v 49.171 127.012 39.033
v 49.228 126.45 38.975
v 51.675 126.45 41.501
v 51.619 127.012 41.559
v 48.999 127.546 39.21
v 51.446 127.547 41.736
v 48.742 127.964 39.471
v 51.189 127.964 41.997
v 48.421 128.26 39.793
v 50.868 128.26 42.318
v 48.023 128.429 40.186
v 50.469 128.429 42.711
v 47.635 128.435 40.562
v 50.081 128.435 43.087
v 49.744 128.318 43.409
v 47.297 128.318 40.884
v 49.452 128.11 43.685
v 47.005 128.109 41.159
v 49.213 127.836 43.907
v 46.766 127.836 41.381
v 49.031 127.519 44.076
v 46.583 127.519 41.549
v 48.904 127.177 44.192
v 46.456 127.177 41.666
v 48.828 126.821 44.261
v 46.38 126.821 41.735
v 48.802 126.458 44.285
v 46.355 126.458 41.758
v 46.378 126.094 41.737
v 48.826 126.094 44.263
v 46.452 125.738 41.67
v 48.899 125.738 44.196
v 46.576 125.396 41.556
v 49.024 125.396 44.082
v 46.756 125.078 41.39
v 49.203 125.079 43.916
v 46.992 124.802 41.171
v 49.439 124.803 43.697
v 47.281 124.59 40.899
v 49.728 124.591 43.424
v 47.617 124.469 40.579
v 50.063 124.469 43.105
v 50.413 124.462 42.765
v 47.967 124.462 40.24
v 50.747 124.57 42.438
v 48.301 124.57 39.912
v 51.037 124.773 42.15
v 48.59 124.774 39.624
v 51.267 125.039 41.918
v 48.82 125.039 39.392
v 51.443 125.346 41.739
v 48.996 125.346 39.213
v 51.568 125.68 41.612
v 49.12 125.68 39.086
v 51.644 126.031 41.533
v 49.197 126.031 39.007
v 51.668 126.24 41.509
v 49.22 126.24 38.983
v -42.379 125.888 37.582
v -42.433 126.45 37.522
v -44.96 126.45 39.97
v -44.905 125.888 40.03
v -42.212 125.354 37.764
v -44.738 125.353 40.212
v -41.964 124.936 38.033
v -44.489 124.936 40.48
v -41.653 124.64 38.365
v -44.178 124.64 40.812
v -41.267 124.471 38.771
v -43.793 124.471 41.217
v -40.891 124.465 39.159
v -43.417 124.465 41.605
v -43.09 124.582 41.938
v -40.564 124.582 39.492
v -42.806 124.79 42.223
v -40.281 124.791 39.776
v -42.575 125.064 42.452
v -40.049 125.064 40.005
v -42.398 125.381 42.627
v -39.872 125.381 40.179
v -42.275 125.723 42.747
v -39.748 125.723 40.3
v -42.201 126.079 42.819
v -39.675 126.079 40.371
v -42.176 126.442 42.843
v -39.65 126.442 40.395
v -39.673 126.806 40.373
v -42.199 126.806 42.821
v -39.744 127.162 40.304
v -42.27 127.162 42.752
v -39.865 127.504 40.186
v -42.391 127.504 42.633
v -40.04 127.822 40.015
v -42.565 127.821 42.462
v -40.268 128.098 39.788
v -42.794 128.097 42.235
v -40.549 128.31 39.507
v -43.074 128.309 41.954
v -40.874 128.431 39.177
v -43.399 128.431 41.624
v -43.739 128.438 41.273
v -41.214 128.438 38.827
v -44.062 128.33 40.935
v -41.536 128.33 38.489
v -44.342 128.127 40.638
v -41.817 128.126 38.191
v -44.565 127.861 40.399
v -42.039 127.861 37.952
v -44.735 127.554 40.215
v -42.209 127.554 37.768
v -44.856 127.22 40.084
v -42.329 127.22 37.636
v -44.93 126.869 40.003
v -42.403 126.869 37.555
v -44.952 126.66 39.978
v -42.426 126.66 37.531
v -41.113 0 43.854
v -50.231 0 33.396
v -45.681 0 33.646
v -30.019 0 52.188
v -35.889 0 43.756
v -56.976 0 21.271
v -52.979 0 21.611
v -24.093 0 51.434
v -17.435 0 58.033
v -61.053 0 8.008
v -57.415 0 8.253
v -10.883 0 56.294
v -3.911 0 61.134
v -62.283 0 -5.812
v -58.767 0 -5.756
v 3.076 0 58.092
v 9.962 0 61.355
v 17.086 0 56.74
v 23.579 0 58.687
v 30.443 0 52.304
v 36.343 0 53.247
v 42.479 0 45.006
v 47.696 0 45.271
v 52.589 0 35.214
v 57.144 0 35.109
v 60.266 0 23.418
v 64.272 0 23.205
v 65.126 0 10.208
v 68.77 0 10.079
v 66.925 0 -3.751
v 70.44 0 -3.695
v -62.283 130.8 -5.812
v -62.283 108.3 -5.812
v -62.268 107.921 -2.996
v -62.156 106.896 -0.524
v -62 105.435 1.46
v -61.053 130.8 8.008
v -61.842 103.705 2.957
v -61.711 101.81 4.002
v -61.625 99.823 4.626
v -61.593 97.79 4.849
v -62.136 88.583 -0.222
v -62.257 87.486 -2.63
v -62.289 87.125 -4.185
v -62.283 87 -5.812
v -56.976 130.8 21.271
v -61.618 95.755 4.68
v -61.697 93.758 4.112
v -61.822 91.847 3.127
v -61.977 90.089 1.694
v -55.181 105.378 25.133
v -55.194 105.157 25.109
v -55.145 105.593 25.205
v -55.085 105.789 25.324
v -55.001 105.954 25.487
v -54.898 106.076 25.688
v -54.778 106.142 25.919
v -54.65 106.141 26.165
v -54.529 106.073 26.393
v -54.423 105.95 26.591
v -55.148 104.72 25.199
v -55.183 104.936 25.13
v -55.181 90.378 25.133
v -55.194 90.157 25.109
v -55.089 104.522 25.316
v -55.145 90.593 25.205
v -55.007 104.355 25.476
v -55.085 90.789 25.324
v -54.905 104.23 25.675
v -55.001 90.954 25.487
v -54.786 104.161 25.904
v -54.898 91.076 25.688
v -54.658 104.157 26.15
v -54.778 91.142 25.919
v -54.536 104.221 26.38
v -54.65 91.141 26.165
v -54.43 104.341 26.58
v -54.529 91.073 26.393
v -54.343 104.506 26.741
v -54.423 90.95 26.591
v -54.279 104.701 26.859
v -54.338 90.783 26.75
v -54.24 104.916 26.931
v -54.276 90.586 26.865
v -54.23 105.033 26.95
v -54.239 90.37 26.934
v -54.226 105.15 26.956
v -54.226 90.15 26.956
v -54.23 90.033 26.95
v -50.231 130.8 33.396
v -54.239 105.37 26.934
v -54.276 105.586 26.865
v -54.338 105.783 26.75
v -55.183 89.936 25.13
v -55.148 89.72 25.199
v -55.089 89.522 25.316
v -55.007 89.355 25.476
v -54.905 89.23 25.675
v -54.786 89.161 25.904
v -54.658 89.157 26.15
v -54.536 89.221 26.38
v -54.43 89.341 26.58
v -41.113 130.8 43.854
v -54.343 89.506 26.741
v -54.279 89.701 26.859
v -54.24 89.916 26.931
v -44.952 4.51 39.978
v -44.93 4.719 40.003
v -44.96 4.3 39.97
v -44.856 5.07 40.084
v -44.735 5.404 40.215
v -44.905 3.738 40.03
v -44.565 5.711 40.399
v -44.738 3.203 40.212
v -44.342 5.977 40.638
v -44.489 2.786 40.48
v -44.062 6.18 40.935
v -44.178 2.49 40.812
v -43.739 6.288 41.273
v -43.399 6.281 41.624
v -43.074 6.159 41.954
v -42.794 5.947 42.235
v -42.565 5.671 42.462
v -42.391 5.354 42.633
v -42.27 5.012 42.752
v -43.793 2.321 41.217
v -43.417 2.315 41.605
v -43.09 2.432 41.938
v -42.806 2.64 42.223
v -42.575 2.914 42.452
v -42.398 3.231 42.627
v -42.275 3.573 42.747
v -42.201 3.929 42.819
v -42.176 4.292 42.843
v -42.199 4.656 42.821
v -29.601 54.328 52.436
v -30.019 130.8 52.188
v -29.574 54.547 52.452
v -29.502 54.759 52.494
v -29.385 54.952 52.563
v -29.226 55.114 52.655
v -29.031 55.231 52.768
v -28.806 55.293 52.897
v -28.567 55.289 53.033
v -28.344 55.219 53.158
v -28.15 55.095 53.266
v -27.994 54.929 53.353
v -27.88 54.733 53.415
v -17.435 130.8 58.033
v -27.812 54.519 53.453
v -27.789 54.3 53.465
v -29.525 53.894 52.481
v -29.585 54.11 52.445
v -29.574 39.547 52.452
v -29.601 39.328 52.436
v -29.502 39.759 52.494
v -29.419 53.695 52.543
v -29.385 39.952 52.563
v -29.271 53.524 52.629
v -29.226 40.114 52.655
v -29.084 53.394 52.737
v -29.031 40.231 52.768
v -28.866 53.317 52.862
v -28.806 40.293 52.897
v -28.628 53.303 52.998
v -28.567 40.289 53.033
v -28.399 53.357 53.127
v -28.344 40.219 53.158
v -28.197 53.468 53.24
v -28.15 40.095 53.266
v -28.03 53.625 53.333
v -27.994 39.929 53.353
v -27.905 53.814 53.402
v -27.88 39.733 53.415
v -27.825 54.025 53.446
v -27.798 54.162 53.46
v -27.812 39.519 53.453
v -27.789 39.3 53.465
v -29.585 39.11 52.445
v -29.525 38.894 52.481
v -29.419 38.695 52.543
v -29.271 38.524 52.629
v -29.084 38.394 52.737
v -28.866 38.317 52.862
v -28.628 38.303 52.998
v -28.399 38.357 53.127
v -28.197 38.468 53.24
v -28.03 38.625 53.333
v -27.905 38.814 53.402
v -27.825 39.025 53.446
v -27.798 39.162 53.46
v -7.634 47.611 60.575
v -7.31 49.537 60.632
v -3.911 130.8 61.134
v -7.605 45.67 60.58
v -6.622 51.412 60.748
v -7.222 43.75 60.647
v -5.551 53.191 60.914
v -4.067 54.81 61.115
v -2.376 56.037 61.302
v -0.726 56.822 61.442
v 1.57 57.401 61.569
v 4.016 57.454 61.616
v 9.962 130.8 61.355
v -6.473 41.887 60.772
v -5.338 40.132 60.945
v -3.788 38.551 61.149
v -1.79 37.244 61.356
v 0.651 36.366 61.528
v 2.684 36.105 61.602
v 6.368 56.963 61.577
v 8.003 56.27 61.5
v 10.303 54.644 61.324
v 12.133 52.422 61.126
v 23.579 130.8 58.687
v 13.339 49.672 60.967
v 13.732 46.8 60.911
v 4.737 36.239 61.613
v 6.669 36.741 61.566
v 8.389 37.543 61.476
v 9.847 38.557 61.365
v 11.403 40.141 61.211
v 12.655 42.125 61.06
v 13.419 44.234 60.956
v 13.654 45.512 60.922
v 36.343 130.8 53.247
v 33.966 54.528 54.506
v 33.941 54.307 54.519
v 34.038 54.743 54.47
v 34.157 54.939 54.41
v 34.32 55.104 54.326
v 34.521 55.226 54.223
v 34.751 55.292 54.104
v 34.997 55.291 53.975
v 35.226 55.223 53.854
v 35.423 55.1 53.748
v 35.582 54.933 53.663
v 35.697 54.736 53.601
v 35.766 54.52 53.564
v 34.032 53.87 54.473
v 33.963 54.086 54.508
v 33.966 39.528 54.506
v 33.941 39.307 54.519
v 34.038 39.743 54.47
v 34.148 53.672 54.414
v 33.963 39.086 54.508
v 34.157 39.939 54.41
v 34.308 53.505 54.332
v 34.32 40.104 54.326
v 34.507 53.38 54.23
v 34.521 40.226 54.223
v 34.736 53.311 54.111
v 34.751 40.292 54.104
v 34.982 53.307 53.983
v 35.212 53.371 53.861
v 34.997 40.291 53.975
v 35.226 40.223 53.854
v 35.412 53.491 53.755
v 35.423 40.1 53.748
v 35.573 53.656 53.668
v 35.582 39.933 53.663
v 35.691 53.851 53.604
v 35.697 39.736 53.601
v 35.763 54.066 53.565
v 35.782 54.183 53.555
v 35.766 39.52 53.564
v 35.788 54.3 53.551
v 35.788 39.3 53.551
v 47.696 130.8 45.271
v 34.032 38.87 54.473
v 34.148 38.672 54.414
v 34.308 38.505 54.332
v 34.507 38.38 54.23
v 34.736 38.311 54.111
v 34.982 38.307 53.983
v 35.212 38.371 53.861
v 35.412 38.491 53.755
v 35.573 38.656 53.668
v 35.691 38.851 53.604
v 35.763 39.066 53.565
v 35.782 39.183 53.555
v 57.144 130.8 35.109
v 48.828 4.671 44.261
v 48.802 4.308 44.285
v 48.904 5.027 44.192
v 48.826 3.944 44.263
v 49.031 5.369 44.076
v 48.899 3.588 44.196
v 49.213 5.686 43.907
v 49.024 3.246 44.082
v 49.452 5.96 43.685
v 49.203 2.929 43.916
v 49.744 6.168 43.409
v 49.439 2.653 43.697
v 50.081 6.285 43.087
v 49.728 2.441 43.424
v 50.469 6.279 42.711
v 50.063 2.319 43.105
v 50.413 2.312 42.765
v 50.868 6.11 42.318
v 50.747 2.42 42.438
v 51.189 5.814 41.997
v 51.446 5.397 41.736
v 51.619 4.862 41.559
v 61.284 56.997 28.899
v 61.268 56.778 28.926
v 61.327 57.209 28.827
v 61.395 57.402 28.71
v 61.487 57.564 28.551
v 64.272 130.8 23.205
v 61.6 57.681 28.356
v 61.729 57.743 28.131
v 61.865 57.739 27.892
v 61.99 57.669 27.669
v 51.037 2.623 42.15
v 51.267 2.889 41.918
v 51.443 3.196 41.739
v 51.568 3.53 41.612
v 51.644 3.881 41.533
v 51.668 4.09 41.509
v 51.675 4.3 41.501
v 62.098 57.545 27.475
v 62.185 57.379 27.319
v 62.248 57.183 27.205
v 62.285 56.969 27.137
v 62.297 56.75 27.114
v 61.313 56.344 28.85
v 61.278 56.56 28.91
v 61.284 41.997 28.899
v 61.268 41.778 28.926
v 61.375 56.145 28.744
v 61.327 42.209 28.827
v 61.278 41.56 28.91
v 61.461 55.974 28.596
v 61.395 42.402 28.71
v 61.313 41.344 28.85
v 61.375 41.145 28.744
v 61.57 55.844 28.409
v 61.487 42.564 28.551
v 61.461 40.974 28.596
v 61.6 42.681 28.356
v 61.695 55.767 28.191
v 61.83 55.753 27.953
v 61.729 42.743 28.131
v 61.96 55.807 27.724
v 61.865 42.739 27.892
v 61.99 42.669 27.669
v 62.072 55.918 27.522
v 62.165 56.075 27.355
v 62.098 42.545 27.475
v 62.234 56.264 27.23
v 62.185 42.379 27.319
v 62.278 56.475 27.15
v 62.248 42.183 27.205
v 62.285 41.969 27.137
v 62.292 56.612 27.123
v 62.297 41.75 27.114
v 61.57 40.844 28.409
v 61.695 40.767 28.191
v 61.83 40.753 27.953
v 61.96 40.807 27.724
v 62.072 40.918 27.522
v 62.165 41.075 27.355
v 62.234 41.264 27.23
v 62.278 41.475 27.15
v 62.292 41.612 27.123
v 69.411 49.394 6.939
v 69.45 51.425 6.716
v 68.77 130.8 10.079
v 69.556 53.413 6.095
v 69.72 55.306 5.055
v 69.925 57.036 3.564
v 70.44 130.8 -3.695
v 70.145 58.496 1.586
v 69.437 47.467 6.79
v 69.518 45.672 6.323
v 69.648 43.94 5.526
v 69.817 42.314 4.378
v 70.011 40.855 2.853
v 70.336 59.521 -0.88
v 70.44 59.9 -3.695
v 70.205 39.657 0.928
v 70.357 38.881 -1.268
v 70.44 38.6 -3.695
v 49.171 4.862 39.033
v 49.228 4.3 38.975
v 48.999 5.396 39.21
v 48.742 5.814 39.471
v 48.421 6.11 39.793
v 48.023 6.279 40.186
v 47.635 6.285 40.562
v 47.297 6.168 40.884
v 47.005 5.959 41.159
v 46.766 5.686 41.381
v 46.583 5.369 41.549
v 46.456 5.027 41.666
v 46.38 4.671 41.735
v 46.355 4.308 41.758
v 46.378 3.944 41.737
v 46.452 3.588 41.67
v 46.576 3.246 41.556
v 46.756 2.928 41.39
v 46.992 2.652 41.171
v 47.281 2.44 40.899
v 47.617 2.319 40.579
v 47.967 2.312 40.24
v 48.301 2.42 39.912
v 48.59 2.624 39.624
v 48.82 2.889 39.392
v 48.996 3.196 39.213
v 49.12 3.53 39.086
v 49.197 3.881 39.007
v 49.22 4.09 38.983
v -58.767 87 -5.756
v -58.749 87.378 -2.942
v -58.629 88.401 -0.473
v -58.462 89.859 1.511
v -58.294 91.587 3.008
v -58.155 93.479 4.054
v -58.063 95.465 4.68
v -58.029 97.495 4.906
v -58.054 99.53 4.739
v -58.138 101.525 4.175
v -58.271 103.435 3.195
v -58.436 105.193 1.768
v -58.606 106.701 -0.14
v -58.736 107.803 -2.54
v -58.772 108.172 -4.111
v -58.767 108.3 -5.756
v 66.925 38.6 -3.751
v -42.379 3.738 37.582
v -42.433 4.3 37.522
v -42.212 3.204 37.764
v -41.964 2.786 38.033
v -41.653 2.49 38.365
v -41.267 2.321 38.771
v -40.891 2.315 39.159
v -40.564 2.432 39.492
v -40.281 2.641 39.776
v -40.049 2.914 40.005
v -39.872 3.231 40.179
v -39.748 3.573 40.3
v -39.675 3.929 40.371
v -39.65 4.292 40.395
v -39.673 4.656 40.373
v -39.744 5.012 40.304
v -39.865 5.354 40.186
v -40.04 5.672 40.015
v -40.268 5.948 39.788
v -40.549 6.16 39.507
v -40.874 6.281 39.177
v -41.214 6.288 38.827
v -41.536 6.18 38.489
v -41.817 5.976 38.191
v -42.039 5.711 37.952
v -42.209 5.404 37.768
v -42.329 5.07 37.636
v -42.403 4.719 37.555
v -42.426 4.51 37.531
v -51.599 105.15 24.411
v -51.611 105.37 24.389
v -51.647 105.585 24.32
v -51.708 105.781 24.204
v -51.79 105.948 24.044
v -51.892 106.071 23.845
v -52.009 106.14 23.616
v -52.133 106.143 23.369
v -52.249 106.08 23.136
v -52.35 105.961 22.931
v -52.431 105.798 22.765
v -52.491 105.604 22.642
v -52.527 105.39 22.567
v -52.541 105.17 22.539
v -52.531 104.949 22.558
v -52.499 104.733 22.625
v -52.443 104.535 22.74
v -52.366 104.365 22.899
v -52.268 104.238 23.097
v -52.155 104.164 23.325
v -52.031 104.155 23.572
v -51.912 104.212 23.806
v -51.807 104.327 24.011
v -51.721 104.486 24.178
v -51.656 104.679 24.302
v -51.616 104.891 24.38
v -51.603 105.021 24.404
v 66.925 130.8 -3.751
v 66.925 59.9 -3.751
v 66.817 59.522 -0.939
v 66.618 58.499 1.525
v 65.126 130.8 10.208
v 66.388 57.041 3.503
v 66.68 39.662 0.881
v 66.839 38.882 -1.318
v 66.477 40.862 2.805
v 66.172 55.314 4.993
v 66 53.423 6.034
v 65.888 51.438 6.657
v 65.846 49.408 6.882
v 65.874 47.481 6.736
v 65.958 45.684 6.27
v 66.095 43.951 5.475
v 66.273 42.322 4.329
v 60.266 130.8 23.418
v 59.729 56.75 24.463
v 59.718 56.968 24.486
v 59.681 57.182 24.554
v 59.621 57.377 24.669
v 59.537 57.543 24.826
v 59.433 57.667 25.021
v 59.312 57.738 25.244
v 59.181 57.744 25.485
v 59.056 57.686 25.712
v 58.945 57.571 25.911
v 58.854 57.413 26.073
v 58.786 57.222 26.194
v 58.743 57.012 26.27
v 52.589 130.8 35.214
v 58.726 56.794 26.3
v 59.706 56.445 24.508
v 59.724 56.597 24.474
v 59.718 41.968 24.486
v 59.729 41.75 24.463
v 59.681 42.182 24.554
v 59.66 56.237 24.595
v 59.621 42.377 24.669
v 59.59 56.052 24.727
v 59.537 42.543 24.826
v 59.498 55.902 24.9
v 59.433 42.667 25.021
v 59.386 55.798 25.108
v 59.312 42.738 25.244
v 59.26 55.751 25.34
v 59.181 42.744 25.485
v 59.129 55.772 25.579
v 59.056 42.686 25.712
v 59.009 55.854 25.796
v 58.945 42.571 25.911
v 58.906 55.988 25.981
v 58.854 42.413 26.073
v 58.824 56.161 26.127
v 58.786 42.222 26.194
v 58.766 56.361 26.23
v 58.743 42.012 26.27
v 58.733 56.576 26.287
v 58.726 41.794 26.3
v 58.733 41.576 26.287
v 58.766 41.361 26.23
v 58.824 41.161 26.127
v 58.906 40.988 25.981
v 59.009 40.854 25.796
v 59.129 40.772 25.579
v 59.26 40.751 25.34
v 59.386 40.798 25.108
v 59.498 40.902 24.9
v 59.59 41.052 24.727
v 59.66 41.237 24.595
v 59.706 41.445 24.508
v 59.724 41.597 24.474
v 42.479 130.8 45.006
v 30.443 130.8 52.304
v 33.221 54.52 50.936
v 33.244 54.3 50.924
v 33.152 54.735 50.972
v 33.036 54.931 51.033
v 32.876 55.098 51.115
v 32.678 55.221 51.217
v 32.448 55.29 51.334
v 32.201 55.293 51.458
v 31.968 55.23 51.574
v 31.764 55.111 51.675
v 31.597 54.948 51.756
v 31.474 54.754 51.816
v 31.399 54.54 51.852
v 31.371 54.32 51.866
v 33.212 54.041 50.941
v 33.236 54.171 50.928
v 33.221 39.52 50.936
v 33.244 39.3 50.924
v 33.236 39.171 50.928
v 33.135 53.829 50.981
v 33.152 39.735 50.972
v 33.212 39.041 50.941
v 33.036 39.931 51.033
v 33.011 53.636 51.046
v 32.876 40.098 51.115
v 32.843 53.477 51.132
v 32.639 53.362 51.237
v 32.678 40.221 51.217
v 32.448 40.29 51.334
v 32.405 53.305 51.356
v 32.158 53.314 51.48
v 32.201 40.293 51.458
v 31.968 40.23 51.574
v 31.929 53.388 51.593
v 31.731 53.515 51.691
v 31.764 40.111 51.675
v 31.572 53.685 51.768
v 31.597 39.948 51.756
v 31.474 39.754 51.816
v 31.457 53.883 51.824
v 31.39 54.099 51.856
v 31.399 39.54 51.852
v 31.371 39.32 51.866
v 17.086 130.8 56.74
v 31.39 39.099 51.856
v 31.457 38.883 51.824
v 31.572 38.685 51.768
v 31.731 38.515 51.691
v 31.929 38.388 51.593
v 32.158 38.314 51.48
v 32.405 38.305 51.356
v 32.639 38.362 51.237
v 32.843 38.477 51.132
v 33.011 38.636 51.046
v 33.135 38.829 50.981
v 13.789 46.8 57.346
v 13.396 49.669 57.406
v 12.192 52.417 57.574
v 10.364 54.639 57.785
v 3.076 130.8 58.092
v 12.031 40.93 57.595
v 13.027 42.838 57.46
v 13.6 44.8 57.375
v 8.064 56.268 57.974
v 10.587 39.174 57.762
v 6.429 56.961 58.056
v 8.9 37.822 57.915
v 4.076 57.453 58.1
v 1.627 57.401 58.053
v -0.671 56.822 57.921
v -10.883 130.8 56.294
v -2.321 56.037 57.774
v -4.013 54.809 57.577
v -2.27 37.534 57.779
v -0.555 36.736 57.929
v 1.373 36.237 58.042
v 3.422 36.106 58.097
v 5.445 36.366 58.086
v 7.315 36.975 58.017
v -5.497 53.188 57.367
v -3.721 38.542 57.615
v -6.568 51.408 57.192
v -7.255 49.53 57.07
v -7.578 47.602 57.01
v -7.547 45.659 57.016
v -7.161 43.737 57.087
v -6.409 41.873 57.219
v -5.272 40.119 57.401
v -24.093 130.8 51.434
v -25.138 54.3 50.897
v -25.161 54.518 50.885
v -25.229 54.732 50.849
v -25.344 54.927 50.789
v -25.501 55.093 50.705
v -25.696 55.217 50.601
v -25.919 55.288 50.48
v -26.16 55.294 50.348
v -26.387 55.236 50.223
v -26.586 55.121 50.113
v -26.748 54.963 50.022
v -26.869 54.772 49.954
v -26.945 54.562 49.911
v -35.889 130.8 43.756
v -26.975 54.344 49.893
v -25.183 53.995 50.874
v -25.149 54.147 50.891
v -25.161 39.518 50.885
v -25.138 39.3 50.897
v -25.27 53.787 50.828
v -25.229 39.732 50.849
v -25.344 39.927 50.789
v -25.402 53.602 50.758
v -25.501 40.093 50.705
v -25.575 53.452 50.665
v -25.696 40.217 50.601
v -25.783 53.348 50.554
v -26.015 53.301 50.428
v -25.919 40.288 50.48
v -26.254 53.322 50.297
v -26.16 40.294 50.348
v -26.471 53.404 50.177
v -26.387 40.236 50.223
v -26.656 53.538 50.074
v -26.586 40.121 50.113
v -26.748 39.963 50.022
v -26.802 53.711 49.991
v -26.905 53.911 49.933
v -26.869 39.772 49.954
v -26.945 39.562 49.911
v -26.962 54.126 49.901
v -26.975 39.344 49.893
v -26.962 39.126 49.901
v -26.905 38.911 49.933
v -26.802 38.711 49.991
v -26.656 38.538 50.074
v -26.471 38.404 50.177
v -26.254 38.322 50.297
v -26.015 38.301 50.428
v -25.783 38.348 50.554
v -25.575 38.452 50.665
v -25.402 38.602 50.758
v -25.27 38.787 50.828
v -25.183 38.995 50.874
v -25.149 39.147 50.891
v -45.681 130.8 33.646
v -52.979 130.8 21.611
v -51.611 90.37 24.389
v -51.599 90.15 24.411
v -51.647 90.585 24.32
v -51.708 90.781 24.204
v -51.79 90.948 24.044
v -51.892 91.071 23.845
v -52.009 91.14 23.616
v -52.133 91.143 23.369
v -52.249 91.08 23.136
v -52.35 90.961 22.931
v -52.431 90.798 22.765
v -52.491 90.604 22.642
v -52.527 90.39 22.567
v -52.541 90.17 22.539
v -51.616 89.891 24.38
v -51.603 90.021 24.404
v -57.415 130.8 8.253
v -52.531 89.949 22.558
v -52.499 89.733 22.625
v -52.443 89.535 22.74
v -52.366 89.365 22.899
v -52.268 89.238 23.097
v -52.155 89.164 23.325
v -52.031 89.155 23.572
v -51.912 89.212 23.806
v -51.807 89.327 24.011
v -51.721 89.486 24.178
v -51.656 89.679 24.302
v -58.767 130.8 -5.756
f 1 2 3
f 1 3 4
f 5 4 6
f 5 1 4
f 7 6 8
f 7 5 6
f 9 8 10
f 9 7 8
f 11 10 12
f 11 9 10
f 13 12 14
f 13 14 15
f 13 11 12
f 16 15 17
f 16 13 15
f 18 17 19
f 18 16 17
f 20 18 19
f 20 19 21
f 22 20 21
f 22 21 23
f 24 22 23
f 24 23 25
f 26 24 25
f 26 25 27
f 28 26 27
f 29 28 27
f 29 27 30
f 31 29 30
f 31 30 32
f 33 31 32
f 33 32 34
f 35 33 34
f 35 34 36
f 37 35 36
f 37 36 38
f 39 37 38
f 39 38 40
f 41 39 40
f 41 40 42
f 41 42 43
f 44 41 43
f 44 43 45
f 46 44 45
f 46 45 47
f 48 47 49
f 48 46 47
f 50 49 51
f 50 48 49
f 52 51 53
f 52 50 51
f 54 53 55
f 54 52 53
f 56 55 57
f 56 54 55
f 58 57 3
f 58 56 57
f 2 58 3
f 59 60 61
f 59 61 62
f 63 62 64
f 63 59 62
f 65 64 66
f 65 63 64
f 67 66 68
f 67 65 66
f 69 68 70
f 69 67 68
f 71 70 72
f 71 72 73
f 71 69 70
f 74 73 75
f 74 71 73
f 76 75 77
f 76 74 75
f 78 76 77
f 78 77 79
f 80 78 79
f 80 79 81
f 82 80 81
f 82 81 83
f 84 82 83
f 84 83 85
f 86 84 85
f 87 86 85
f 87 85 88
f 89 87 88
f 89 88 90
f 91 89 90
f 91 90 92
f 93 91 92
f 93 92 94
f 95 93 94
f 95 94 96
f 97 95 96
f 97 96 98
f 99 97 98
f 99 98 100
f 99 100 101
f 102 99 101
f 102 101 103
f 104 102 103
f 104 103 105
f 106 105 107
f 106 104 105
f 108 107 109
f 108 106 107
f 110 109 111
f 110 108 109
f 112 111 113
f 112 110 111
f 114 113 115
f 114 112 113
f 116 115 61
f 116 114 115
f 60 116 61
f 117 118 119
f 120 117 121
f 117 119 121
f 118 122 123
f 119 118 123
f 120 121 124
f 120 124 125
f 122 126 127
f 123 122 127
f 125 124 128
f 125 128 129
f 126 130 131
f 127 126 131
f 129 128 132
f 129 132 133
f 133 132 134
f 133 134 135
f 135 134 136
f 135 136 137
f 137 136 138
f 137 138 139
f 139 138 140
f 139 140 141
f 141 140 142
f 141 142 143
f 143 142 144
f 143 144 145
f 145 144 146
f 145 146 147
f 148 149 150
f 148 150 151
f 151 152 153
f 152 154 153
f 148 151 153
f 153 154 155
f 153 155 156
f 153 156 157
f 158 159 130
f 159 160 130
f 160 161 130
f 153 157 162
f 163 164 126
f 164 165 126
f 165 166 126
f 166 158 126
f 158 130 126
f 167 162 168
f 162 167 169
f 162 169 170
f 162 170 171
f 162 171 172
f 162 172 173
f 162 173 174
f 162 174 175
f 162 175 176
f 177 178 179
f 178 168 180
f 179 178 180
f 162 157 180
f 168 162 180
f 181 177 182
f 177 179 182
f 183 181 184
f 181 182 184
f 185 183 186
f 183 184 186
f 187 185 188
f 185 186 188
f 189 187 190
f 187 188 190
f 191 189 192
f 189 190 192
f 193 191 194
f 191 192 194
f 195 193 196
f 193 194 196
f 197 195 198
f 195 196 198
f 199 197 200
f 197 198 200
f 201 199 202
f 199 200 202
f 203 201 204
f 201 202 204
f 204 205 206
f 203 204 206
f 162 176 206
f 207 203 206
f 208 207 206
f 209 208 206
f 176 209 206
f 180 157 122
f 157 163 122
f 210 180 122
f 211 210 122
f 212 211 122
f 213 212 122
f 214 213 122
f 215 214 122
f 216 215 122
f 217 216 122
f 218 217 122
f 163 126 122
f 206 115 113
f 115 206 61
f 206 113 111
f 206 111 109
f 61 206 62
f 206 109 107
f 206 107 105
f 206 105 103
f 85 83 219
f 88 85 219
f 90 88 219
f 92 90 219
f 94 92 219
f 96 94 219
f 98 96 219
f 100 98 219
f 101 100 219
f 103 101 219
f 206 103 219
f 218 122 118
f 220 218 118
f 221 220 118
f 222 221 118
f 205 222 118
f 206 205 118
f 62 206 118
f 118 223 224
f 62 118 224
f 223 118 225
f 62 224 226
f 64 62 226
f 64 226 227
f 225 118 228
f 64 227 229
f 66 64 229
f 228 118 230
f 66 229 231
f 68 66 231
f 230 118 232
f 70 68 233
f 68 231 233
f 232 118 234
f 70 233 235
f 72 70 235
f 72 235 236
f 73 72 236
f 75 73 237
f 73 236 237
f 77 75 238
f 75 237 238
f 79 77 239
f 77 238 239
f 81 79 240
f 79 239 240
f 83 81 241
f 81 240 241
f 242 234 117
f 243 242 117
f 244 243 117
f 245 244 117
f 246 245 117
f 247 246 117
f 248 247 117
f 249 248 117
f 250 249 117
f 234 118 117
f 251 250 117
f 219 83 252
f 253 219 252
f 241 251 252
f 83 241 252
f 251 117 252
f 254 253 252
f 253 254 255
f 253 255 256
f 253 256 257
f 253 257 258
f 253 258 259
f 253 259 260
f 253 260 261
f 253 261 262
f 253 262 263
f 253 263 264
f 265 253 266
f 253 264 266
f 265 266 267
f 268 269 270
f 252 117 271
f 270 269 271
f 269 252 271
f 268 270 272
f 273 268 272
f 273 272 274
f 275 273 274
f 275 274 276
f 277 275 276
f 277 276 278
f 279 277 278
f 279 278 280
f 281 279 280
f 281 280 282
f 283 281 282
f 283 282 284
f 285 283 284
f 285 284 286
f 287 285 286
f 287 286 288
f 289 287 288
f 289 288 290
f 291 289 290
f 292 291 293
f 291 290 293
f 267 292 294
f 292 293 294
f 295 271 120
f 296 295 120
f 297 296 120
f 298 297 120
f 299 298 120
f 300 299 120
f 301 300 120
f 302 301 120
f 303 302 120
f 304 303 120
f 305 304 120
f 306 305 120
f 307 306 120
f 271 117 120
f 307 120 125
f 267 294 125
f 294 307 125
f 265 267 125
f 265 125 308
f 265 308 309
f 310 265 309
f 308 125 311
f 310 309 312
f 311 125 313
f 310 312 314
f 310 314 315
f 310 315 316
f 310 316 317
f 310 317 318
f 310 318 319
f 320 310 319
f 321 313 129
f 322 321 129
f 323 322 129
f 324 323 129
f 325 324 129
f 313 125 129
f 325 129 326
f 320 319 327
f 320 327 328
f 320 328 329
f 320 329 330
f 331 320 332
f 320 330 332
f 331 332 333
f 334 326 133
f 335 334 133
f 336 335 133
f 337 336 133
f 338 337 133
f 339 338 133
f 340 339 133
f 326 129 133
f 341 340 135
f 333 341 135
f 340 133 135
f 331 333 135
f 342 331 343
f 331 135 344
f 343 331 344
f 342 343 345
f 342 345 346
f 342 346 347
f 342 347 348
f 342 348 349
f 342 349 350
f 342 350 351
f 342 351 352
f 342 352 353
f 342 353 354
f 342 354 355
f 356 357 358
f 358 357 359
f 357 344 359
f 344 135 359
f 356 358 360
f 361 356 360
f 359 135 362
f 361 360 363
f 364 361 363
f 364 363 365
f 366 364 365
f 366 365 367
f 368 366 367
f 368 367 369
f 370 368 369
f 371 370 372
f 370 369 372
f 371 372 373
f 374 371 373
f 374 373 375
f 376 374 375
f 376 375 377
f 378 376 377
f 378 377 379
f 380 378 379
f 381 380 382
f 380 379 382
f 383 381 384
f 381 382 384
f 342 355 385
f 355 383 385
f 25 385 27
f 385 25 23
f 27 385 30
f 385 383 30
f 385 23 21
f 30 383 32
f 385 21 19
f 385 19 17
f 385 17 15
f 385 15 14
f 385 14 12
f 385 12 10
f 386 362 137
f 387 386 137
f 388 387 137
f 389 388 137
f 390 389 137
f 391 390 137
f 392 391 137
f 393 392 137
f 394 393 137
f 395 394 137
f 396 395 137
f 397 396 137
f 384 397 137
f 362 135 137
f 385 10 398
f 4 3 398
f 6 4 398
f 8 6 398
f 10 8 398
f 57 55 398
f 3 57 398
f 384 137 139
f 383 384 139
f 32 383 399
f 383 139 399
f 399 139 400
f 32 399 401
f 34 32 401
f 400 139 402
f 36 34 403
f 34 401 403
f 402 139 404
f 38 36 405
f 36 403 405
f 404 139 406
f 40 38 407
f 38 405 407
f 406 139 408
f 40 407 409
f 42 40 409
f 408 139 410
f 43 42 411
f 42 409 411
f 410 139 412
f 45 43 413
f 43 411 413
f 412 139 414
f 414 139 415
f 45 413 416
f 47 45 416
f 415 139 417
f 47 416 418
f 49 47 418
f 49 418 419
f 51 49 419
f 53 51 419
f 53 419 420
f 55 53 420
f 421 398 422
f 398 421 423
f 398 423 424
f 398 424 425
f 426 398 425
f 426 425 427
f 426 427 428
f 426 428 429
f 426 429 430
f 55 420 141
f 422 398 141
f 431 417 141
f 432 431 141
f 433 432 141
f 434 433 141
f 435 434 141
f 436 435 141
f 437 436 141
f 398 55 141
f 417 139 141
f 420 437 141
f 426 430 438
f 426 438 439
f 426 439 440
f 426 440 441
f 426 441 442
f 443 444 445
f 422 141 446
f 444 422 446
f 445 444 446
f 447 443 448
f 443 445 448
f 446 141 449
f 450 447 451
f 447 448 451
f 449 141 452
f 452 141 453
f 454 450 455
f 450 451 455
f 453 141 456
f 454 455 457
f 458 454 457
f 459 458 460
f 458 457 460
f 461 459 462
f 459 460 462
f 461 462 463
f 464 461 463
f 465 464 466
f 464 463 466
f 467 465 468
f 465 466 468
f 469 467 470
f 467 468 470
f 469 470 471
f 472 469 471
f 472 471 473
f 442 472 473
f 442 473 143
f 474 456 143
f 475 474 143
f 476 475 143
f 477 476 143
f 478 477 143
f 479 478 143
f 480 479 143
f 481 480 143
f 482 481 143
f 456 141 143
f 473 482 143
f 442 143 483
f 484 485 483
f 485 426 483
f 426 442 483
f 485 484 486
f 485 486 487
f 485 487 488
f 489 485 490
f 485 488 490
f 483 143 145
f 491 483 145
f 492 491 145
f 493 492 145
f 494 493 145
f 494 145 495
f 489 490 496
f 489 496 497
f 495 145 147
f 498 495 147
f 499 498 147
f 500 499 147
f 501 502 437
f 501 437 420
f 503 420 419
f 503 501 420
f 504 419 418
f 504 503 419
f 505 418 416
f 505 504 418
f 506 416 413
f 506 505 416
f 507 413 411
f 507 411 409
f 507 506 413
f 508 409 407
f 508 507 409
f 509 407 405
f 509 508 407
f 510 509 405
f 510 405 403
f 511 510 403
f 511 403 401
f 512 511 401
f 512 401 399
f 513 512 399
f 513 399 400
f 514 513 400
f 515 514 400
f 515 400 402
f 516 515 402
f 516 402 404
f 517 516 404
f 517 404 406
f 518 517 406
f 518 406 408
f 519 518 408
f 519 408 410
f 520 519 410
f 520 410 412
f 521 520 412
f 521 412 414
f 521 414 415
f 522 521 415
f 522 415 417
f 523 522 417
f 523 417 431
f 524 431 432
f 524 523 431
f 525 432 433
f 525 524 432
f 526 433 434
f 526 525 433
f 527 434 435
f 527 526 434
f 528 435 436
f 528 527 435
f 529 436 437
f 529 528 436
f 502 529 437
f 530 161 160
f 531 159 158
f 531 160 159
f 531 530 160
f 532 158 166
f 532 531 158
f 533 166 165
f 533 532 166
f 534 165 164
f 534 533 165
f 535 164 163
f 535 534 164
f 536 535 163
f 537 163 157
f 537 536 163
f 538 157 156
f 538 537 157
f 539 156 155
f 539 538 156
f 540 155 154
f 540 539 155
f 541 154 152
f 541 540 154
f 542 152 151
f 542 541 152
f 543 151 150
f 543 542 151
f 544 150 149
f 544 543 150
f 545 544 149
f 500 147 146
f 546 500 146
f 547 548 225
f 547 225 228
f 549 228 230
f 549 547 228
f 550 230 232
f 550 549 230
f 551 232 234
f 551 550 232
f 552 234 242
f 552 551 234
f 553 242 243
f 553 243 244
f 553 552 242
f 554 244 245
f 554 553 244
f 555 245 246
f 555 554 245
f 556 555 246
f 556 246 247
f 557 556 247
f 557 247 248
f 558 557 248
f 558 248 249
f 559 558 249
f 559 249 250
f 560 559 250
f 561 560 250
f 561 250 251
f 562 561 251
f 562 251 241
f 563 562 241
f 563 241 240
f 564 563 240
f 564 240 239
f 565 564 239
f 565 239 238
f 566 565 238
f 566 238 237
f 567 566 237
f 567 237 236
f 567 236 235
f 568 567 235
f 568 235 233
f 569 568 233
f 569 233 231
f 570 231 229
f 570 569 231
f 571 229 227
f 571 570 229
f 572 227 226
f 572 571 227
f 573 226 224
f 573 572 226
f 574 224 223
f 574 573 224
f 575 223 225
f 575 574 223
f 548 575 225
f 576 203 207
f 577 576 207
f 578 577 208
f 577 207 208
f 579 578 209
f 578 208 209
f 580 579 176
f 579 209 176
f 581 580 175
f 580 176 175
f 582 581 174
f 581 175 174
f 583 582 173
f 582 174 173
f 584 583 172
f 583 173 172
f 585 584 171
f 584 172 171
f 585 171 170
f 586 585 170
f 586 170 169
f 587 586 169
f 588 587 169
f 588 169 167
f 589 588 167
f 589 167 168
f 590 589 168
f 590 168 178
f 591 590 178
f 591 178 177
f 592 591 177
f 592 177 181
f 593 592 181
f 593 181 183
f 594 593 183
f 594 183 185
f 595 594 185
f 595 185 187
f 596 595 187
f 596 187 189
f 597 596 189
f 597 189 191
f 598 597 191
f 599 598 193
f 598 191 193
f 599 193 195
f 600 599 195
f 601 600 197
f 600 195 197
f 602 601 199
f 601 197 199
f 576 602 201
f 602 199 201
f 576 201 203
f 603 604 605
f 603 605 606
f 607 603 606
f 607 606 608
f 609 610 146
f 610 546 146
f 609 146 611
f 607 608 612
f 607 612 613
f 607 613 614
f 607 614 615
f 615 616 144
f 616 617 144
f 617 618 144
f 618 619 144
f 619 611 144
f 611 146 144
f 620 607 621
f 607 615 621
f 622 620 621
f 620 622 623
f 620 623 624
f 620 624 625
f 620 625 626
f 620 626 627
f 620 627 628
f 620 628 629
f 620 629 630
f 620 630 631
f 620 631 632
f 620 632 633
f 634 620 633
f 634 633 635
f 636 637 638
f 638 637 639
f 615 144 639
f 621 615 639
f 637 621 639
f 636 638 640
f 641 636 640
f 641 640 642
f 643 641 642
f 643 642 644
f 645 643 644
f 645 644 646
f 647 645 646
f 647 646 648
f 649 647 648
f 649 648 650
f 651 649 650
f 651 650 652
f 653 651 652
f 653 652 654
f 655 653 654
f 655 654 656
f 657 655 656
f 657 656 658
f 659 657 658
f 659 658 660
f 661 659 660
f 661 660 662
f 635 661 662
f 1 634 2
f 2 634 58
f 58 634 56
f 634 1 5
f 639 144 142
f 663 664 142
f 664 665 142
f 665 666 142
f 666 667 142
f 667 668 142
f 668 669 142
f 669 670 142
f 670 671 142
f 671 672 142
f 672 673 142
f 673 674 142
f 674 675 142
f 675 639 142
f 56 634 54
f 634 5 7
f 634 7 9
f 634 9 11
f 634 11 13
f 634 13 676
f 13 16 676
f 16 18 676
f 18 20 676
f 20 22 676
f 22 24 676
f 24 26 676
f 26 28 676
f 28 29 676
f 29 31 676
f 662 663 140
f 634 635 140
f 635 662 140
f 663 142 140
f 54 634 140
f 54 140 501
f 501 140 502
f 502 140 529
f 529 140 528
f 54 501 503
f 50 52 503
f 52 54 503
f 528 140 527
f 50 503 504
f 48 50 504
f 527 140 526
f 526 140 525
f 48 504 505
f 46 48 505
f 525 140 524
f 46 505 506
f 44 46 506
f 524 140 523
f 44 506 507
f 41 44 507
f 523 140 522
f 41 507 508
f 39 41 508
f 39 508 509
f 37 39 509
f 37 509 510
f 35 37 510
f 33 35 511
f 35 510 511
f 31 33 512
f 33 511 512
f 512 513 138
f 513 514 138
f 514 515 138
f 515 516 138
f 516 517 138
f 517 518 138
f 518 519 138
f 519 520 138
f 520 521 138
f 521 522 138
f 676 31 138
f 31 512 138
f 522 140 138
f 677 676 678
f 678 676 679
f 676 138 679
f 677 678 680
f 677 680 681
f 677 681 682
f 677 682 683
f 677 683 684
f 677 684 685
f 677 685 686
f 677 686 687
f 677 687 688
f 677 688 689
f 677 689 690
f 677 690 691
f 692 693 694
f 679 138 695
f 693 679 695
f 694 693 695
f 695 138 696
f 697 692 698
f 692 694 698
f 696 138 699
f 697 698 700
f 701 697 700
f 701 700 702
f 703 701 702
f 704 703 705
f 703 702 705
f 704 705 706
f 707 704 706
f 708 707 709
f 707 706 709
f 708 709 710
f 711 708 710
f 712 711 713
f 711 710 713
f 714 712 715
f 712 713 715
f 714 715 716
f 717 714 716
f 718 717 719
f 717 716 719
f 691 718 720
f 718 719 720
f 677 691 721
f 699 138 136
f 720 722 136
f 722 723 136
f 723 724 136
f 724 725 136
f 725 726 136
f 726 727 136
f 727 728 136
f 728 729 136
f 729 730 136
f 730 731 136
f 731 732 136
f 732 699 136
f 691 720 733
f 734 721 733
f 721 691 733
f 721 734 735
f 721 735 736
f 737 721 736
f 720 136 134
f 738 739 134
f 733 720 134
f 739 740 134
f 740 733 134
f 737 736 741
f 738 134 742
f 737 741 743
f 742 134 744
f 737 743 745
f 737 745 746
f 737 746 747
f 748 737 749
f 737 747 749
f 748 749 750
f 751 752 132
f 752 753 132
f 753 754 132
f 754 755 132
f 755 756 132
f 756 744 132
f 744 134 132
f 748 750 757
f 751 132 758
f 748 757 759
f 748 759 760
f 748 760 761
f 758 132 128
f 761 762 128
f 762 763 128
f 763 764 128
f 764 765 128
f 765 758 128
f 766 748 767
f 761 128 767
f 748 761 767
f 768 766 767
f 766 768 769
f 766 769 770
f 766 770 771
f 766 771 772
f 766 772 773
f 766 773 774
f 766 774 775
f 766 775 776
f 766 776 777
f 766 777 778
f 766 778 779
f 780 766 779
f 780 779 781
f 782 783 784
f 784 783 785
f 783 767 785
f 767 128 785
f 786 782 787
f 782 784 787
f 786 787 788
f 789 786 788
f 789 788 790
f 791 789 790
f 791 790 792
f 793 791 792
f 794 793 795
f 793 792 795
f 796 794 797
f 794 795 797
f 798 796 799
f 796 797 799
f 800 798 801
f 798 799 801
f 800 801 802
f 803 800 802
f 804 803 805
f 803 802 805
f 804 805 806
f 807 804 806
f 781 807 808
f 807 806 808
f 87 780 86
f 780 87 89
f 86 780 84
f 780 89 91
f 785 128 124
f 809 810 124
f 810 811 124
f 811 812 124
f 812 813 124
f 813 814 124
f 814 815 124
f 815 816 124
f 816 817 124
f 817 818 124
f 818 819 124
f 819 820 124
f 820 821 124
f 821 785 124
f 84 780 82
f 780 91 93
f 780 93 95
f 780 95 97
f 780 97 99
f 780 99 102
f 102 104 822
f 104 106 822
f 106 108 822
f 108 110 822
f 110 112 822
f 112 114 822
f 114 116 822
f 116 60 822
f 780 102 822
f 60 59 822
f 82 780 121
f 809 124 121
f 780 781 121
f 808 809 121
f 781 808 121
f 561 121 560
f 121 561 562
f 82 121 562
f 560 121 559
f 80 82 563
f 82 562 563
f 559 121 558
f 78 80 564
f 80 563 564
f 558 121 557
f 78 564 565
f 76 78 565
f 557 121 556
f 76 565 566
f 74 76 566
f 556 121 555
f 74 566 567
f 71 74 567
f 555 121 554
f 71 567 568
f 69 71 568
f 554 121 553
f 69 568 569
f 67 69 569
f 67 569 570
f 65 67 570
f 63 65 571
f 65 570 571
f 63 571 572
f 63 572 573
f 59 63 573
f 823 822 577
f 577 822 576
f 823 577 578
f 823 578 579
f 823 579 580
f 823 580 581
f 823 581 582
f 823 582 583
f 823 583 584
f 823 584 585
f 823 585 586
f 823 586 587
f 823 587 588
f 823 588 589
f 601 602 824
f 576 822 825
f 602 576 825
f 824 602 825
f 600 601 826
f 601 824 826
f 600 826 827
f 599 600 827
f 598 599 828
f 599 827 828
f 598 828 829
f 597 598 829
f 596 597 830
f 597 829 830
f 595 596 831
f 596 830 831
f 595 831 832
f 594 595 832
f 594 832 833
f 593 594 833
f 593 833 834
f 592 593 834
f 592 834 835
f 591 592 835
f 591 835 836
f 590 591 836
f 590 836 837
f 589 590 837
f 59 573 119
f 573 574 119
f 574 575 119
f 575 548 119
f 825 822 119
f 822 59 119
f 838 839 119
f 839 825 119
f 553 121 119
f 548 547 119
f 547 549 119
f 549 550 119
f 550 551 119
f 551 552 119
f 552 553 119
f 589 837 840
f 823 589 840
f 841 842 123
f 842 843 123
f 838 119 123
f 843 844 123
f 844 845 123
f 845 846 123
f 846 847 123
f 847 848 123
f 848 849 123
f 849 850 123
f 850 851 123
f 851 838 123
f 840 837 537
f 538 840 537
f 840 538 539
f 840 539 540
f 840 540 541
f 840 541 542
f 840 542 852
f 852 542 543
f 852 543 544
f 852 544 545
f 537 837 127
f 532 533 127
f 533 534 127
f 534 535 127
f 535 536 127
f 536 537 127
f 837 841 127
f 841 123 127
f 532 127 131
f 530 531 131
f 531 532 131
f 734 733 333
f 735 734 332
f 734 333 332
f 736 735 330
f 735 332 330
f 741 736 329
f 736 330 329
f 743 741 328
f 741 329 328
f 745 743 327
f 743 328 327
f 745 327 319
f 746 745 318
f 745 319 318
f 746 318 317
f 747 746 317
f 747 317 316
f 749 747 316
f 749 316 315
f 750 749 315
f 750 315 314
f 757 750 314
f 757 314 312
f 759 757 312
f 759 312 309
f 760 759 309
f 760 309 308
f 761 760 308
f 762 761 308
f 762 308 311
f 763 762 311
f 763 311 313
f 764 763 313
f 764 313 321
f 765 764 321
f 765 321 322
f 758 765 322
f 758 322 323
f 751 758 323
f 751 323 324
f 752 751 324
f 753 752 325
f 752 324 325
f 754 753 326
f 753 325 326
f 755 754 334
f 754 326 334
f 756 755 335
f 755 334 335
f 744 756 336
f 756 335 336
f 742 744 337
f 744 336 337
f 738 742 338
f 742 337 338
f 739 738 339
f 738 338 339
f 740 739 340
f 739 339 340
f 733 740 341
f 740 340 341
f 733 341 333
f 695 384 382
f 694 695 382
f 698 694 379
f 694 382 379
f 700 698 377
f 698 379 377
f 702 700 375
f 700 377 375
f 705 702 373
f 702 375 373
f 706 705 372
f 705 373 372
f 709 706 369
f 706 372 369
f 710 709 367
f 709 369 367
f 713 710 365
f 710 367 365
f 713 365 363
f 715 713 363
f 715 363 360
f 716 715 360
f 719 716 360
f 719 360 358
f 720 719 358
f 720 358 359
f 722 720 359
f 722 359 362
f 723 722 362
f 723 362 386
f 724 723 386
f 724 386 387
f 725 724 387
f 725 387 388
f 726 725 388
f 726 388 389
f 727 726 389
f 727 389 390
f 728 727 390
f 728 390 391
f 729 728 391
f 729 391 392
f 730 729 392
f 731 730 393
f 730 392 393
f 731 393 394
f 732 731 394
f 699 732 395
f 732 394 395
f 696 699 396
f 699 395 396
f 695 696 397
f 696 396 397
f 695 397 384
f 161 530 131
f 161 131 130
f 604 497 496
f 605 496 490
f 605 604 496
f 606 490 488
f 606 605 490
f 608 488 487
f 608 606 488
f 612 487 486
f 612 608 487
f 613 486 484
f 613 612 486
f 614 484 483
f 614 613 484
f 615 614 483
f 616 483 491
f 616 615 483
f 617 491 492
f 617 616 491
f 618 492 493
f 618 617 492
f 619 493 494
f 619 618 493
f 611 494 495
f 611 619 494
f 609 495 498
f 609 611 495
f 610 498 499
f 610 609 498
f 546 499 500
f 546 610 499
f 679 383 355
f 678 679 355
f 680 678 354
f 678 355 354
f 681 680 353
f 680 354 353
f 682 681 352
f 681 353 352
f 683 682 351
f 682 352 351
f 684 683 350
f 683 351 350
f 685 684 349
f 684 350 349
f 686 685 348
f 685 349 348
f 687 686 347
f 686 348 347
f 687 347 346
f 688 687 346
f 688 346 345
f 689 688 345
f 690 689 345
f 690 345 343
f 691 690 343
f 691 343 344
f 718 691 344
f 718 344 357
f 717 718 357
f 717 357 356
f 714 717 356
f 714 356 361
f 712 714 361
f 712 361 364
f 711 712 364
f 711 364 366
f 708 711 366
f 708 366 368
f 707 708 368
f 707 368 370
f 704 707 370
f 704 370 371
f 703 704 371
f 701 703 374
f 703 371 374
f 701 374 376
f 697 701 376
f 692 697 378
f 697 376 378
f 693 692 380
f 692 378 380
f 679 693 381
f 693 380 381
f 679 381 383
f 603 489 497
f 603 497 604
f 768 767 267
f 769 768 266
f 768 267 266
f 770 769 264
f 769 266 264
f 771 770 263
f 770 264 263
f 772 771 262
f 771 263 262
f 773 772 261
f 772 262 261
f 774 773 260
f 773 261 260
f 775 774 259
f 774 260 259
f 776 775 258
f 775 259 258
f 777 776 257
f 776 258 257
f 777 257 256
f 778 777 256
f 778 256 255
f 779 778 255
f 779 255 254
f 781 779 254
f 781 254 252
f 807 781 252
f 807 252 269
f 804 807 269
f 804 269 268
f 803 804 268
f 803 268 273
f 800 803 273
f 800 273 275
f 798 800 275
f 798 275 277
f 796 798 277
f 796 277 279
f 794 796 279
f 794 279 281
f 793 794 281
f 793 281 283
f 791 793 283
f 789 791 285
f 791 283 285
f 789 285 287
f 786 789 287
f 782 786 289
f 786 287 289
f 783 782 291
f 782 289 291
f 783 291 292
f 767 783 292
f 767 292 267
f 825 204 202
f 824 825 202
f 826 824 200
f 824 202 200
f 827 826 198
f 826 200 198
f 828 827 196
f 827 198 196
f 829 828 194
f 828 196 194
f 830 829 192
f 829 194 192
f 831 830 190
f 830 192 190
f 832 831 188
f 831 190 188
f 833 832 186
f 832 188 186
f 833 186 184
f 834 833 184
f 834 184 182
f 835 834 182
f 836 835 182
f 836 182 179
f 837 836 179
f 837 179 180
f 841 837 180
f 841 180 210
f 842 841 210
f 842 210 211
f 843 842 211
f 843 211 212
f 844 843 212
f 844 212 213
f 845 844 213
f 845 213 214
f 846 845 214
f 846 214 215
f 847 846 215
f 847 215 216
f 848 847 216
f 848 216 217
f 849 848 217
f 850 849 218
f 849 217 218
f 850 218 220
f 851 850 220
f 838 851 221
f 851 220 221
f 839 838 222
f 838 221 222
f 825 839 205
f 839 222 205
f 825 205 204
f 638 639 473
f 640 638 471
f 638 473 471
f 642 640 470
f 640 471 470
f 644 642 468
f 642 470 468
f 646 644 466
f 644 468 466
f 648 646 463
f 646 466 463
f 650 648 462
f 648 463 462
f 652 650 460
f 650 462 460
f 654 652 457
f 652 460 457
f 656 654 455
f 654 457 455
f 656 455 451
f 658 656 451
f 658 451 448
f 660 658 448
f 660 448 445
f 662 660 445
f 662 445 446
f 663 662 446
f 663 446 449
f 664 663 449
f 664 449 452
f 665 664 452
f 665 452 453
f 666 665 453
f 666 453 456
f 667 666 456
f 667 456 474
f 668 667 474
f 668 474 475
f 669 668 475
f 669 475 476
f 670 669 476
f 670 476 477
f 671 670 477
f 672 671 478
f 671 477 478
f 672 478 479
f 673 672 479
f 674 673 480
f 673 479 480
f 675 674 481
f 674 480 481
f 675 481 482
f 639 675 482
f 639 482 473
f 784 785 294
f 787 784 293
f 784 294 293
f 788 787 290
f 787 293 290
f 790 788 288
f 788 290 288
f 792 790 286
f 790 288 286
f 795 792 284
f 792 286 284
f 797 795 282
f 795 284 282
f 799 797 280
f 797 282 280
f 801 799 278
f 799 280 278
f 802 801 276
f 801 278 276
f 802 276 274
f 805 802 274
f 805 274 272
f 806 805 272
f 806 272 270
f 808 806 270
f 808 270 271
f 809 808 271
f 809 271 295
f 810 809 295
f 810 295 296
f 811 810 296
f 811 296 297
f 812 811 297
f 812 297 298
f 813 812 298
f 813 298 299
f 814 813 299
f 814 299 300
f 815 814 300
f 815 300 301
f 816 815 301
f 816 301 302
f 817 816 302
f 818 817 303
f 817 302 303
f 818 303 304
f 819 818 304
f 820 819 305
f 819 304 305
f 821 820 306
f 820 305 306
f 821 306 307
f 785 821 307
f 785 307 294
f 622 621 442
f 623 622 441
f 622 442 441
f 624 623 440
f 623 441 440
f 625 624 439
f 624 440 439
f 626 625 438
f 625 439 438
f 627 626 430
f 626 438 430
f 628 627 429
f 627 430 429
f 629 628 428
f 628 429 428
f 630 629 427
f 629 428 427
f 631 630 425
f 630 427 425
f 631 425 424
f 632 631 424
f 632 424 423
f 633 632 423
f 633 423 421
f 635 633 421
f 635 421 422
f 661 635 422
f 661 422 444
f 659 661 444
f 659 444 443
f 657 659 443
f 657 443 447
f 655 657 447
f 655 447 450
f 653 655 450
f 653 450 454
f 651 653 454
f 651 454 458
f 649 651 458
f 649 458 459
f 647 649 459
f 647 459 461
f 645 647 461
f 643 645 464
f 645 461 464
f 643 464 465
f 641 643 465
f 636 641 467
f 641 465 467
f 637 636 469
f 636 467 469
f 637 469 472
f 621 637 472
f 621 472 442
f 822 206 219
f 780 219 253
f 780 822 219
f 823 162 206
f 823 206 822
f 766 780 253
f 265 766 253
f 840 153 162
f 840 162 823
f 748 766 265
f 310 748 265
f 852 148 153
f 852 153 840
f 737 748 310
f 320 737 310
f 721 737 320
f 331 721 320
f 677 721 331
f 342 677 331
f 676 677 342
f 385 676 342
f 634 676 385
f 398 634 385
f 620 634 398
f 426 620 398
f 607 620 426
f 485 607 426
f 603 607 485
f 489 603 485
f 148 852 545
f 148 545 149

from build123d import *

# Parameters (mm, degrees)
BOSS_EXTRUDE1_DEPTH      = 130.8
SKETCH5_R                = 10.65
CUT_EXTRUDE4_DEPTH       = 129.8
SKETCH6_R                = 10.65
CUT_EXTRUDE5_DEPTH       = 129.8
SKETCH57_R               = 10.7
CUT_EXTRUDE48_DEPTH      = 148.089829044
CUT_EXTRUDE51_DEPTH      = 132.35522197
CUT_EXTRUDE51_DEPTH_BACK = 132.35522197
SKETCH60_R               = 2
CUT_EXTRUDE52_DEPTH      = 132.574432074
CUT_EXTRUDE52_DEPTH_BACK = 132.574432074
SKETCH61_R               = 2.000000001
SKETCH63_R               = 1
CUT_EXTRUDE53_DEPTH      = 155.429604817
SKETCH64_R               = 1
CUT_EXTRUDE54_DEPTH      = 157.678735431
SKETCH65_R               = 1
CUT_EXTRUDE55_DEPTH      = 157.678735431
SKETCH66_R               = 1
CUT_EXTRUDE56_DEPTH      = 155.429604817


with BuildPart() as part:
    # Sketch1 → Boss-Extrude1 (new body)
    with BuildSketch(Plane(origin=(0, 0, 0), x_dir=(0.999872775920664, 0, 0.01595092388251422), z_dir=(0, 1, 0))):
        with BuildLine():
            Line((70.372282363, 4.818066557), (66.856282363, 4.818066557))
            ThreePointArc((66.856282363, 4.818066557), (4.002282363, -58.035933443), (-58.851717637, 4.818066557))
            Line((-58.851717637, 4.818066557), (-62.367717637, 4.818066557))
            ThreePointArc((-62.367717637, 4.818066557), (4.002282363, -61.551933443), (70.372282363, 4.818066557))
        make_face()
    extrude(amount=BOSS_EXTRUDE1_DEPTH)

    # Sketch5 → Cut-Extrude4 (cut)
    with BuildSketch(Plane(origin=(63.687908888, 47.899932993, -8.621348971), x_dir=(0.015950923882504298, 0, -0.9998727759206641), z_dir=(0.9998727759206643, 0, 0.015950923882504298))):
        with Locations((-4.818066557, 1.350067007)):
            Circle(SKETCH5_R)
    extrude(amount=CUT_EXTRUDE4_DEPTH, mode=Mode.SUBTRACT)

    # Sketch6 → Cut-Extrude5 (cut)
    with BuildSketch(Plane(origin=(-55.376952084, 47.899932993, -10.520785159), x_dir=(-0.01595092388248271, 0, 0.9998727759206645), z_dir=(-0.9998727759206645, 0, -0.01595092388248271))):
        with Locations((4.818066557, 49.750067007)):
            Circle(SKETCH6_R)
    extrude(amount=CUT_EXTRUDE5_DEPTH, mode=Mode.SUBTRACT)

    # Sketch57 → Cut-Extrude48 (cut, through all)
    with BuildSketch(Plane(origin=(-1.337515808, 38.899932993, 83.841265458), x_dir=(0.999872775920664, 0, 0.015950923882512152), z_dir=(-0.015950923882512152, 0, 0.999872775920664))):
        with Locations((4.002282363, 7.900067007)):
            Circle(SKETCH57_R)
    extrude(amount=-CUT_EXTRUDE48_DEPTH, mode=Mode.SUBTRACT)

    # Sketch60 → Cut-Extrude51 (cut, two sides: drawn at the far end of the back side and taken through both)
    with BuildSketch(Plane(origin=(4.479542792, 38.899932993, -4.33978545), x_dir=(0.6958141043149662, 0, 0.7182219240850013), z_dir=(-0.7182219240850013, 0, 0.6958141043149662)).offset(-CUT_EXTRUDE51_DEPTH_BACK)):
        with Locations((-0.576184071, 87.550067007)):
            Circle(SKETCH60_R)
        with Locations((-0.576184071, -34.599932993)):
            Circle(SKETCH60_R)
    extrude(amount=CUT_EXTRUDE51_DEPTH + CUT_EXTRUDE51_DEPTH_BACK, mode=Mode.SUBTRACT)

    # Sketch61 → Cut-Extrude52 (cut, two sides: drawn at the far end of the back side and taken through both)
    with BuildSketch(Plane(origin=(-0.400917003, 38.899932993, -0.413828032), x_dir=(0.7182219240850013, 0, -0.6958141043149662), z_dir=(0.6958141043149662, 0, 0.7182219240850013)).offset(-CUT_EXTRUDE52_DEPTH_BACK)):
        with Locations((6.236989769, 87.550067007)):
            Circle(SKETCH61_R)
        with Locations((6.236989769, -34.599932997)):
            Circle(SKETCH61_R)
    extrude(amount=CUT_EXTRUDE52_DEPTH + CUT_EXTRUDE52_DEPTH_BACK, mode=Mode.SUBTRACT)

    # Sketch63 → Cut-Extrude53 (cut, through all)
    with BuildSketch(Plane(origin=(48.51495843, 38.899932993, 50.087966302), x_dir=(0.718295826620825, 0, -0.6957378137338129), z_dir=(0.6957378137338129, 0, 0.718295826620825))):
        with Locations((-12.551102324, 15.400067007)):
            Circle(SKETCH63_R)
        with Locations((-12.551102324, 0.400067007)):
            Circle(SKETCH63_R)
    extrude(amount=-CUT_EXTRUDE53_DEPTH, mode=Mode.SUBTRACT)

    # Sketch64 → Cut-Extrude54 (cut, through all)
    with BuildSketch(Plane(origin=(-46.022353024, 38.899932993, 44.577025355), x_dir=(0.6957378137337953, 0, 0.7182958266208421), z_dir=(-0.7182958266208421, 0, 0.6957378137337953))):
        with Locations((18.069559284, 15.400067007)):
            Circle(SKETCH64_R)
        with Locations((18.069559284, 0.400067007)):
            Circle(SKETCH64_R)
    extrude(amount=-CUT_EXTRUDE54_DEPTH, mode=Mode.SUBTRACT)

    # Sketch65 → Cut-Extrude55 (cut, through all)
    with BuildSketch(Plane(origin=(-46.022353024, 38.899932993, 44.577025355), x_dir=(0.6957378137338341, 0, 0.7182958266208045), z_dir=(-0.7182958266208045, 0, 0.6957378137338341))):
        with Locations((-19.364877393, 66.250067007)):
            Circle(SKETCH65_R)
        with Locations((-19.364877393, 51.250067007)):
            Circle(SKETCH65_R)
    extrude(amount=-CUT_EXTRUDE55_DEPTH, mode=Mode.SUBTRACT)

    # Sketch66 → Cut-Extrude56 (cut, through all)
    with BuildSketch(Plane(origin=(48.51495843, 38.899932993, 50.087966302), x_dir=(0.7182958266208437, 0, -0.6957378137337936), z_dir=(0.6957378137337936, 0, 0.7182958266208437))):
        with Locations((24.883334353, 17.850067007)):
            Circle(SKETCH66_R)
        with Locations((24.883334353, 2.850067007)):
            Circle(SKETCH66_R)
    extrude(amount=-CUT_EXTRUDE56_DEPTH, mode=Mode.SUBTRACT)


solid = part.part
